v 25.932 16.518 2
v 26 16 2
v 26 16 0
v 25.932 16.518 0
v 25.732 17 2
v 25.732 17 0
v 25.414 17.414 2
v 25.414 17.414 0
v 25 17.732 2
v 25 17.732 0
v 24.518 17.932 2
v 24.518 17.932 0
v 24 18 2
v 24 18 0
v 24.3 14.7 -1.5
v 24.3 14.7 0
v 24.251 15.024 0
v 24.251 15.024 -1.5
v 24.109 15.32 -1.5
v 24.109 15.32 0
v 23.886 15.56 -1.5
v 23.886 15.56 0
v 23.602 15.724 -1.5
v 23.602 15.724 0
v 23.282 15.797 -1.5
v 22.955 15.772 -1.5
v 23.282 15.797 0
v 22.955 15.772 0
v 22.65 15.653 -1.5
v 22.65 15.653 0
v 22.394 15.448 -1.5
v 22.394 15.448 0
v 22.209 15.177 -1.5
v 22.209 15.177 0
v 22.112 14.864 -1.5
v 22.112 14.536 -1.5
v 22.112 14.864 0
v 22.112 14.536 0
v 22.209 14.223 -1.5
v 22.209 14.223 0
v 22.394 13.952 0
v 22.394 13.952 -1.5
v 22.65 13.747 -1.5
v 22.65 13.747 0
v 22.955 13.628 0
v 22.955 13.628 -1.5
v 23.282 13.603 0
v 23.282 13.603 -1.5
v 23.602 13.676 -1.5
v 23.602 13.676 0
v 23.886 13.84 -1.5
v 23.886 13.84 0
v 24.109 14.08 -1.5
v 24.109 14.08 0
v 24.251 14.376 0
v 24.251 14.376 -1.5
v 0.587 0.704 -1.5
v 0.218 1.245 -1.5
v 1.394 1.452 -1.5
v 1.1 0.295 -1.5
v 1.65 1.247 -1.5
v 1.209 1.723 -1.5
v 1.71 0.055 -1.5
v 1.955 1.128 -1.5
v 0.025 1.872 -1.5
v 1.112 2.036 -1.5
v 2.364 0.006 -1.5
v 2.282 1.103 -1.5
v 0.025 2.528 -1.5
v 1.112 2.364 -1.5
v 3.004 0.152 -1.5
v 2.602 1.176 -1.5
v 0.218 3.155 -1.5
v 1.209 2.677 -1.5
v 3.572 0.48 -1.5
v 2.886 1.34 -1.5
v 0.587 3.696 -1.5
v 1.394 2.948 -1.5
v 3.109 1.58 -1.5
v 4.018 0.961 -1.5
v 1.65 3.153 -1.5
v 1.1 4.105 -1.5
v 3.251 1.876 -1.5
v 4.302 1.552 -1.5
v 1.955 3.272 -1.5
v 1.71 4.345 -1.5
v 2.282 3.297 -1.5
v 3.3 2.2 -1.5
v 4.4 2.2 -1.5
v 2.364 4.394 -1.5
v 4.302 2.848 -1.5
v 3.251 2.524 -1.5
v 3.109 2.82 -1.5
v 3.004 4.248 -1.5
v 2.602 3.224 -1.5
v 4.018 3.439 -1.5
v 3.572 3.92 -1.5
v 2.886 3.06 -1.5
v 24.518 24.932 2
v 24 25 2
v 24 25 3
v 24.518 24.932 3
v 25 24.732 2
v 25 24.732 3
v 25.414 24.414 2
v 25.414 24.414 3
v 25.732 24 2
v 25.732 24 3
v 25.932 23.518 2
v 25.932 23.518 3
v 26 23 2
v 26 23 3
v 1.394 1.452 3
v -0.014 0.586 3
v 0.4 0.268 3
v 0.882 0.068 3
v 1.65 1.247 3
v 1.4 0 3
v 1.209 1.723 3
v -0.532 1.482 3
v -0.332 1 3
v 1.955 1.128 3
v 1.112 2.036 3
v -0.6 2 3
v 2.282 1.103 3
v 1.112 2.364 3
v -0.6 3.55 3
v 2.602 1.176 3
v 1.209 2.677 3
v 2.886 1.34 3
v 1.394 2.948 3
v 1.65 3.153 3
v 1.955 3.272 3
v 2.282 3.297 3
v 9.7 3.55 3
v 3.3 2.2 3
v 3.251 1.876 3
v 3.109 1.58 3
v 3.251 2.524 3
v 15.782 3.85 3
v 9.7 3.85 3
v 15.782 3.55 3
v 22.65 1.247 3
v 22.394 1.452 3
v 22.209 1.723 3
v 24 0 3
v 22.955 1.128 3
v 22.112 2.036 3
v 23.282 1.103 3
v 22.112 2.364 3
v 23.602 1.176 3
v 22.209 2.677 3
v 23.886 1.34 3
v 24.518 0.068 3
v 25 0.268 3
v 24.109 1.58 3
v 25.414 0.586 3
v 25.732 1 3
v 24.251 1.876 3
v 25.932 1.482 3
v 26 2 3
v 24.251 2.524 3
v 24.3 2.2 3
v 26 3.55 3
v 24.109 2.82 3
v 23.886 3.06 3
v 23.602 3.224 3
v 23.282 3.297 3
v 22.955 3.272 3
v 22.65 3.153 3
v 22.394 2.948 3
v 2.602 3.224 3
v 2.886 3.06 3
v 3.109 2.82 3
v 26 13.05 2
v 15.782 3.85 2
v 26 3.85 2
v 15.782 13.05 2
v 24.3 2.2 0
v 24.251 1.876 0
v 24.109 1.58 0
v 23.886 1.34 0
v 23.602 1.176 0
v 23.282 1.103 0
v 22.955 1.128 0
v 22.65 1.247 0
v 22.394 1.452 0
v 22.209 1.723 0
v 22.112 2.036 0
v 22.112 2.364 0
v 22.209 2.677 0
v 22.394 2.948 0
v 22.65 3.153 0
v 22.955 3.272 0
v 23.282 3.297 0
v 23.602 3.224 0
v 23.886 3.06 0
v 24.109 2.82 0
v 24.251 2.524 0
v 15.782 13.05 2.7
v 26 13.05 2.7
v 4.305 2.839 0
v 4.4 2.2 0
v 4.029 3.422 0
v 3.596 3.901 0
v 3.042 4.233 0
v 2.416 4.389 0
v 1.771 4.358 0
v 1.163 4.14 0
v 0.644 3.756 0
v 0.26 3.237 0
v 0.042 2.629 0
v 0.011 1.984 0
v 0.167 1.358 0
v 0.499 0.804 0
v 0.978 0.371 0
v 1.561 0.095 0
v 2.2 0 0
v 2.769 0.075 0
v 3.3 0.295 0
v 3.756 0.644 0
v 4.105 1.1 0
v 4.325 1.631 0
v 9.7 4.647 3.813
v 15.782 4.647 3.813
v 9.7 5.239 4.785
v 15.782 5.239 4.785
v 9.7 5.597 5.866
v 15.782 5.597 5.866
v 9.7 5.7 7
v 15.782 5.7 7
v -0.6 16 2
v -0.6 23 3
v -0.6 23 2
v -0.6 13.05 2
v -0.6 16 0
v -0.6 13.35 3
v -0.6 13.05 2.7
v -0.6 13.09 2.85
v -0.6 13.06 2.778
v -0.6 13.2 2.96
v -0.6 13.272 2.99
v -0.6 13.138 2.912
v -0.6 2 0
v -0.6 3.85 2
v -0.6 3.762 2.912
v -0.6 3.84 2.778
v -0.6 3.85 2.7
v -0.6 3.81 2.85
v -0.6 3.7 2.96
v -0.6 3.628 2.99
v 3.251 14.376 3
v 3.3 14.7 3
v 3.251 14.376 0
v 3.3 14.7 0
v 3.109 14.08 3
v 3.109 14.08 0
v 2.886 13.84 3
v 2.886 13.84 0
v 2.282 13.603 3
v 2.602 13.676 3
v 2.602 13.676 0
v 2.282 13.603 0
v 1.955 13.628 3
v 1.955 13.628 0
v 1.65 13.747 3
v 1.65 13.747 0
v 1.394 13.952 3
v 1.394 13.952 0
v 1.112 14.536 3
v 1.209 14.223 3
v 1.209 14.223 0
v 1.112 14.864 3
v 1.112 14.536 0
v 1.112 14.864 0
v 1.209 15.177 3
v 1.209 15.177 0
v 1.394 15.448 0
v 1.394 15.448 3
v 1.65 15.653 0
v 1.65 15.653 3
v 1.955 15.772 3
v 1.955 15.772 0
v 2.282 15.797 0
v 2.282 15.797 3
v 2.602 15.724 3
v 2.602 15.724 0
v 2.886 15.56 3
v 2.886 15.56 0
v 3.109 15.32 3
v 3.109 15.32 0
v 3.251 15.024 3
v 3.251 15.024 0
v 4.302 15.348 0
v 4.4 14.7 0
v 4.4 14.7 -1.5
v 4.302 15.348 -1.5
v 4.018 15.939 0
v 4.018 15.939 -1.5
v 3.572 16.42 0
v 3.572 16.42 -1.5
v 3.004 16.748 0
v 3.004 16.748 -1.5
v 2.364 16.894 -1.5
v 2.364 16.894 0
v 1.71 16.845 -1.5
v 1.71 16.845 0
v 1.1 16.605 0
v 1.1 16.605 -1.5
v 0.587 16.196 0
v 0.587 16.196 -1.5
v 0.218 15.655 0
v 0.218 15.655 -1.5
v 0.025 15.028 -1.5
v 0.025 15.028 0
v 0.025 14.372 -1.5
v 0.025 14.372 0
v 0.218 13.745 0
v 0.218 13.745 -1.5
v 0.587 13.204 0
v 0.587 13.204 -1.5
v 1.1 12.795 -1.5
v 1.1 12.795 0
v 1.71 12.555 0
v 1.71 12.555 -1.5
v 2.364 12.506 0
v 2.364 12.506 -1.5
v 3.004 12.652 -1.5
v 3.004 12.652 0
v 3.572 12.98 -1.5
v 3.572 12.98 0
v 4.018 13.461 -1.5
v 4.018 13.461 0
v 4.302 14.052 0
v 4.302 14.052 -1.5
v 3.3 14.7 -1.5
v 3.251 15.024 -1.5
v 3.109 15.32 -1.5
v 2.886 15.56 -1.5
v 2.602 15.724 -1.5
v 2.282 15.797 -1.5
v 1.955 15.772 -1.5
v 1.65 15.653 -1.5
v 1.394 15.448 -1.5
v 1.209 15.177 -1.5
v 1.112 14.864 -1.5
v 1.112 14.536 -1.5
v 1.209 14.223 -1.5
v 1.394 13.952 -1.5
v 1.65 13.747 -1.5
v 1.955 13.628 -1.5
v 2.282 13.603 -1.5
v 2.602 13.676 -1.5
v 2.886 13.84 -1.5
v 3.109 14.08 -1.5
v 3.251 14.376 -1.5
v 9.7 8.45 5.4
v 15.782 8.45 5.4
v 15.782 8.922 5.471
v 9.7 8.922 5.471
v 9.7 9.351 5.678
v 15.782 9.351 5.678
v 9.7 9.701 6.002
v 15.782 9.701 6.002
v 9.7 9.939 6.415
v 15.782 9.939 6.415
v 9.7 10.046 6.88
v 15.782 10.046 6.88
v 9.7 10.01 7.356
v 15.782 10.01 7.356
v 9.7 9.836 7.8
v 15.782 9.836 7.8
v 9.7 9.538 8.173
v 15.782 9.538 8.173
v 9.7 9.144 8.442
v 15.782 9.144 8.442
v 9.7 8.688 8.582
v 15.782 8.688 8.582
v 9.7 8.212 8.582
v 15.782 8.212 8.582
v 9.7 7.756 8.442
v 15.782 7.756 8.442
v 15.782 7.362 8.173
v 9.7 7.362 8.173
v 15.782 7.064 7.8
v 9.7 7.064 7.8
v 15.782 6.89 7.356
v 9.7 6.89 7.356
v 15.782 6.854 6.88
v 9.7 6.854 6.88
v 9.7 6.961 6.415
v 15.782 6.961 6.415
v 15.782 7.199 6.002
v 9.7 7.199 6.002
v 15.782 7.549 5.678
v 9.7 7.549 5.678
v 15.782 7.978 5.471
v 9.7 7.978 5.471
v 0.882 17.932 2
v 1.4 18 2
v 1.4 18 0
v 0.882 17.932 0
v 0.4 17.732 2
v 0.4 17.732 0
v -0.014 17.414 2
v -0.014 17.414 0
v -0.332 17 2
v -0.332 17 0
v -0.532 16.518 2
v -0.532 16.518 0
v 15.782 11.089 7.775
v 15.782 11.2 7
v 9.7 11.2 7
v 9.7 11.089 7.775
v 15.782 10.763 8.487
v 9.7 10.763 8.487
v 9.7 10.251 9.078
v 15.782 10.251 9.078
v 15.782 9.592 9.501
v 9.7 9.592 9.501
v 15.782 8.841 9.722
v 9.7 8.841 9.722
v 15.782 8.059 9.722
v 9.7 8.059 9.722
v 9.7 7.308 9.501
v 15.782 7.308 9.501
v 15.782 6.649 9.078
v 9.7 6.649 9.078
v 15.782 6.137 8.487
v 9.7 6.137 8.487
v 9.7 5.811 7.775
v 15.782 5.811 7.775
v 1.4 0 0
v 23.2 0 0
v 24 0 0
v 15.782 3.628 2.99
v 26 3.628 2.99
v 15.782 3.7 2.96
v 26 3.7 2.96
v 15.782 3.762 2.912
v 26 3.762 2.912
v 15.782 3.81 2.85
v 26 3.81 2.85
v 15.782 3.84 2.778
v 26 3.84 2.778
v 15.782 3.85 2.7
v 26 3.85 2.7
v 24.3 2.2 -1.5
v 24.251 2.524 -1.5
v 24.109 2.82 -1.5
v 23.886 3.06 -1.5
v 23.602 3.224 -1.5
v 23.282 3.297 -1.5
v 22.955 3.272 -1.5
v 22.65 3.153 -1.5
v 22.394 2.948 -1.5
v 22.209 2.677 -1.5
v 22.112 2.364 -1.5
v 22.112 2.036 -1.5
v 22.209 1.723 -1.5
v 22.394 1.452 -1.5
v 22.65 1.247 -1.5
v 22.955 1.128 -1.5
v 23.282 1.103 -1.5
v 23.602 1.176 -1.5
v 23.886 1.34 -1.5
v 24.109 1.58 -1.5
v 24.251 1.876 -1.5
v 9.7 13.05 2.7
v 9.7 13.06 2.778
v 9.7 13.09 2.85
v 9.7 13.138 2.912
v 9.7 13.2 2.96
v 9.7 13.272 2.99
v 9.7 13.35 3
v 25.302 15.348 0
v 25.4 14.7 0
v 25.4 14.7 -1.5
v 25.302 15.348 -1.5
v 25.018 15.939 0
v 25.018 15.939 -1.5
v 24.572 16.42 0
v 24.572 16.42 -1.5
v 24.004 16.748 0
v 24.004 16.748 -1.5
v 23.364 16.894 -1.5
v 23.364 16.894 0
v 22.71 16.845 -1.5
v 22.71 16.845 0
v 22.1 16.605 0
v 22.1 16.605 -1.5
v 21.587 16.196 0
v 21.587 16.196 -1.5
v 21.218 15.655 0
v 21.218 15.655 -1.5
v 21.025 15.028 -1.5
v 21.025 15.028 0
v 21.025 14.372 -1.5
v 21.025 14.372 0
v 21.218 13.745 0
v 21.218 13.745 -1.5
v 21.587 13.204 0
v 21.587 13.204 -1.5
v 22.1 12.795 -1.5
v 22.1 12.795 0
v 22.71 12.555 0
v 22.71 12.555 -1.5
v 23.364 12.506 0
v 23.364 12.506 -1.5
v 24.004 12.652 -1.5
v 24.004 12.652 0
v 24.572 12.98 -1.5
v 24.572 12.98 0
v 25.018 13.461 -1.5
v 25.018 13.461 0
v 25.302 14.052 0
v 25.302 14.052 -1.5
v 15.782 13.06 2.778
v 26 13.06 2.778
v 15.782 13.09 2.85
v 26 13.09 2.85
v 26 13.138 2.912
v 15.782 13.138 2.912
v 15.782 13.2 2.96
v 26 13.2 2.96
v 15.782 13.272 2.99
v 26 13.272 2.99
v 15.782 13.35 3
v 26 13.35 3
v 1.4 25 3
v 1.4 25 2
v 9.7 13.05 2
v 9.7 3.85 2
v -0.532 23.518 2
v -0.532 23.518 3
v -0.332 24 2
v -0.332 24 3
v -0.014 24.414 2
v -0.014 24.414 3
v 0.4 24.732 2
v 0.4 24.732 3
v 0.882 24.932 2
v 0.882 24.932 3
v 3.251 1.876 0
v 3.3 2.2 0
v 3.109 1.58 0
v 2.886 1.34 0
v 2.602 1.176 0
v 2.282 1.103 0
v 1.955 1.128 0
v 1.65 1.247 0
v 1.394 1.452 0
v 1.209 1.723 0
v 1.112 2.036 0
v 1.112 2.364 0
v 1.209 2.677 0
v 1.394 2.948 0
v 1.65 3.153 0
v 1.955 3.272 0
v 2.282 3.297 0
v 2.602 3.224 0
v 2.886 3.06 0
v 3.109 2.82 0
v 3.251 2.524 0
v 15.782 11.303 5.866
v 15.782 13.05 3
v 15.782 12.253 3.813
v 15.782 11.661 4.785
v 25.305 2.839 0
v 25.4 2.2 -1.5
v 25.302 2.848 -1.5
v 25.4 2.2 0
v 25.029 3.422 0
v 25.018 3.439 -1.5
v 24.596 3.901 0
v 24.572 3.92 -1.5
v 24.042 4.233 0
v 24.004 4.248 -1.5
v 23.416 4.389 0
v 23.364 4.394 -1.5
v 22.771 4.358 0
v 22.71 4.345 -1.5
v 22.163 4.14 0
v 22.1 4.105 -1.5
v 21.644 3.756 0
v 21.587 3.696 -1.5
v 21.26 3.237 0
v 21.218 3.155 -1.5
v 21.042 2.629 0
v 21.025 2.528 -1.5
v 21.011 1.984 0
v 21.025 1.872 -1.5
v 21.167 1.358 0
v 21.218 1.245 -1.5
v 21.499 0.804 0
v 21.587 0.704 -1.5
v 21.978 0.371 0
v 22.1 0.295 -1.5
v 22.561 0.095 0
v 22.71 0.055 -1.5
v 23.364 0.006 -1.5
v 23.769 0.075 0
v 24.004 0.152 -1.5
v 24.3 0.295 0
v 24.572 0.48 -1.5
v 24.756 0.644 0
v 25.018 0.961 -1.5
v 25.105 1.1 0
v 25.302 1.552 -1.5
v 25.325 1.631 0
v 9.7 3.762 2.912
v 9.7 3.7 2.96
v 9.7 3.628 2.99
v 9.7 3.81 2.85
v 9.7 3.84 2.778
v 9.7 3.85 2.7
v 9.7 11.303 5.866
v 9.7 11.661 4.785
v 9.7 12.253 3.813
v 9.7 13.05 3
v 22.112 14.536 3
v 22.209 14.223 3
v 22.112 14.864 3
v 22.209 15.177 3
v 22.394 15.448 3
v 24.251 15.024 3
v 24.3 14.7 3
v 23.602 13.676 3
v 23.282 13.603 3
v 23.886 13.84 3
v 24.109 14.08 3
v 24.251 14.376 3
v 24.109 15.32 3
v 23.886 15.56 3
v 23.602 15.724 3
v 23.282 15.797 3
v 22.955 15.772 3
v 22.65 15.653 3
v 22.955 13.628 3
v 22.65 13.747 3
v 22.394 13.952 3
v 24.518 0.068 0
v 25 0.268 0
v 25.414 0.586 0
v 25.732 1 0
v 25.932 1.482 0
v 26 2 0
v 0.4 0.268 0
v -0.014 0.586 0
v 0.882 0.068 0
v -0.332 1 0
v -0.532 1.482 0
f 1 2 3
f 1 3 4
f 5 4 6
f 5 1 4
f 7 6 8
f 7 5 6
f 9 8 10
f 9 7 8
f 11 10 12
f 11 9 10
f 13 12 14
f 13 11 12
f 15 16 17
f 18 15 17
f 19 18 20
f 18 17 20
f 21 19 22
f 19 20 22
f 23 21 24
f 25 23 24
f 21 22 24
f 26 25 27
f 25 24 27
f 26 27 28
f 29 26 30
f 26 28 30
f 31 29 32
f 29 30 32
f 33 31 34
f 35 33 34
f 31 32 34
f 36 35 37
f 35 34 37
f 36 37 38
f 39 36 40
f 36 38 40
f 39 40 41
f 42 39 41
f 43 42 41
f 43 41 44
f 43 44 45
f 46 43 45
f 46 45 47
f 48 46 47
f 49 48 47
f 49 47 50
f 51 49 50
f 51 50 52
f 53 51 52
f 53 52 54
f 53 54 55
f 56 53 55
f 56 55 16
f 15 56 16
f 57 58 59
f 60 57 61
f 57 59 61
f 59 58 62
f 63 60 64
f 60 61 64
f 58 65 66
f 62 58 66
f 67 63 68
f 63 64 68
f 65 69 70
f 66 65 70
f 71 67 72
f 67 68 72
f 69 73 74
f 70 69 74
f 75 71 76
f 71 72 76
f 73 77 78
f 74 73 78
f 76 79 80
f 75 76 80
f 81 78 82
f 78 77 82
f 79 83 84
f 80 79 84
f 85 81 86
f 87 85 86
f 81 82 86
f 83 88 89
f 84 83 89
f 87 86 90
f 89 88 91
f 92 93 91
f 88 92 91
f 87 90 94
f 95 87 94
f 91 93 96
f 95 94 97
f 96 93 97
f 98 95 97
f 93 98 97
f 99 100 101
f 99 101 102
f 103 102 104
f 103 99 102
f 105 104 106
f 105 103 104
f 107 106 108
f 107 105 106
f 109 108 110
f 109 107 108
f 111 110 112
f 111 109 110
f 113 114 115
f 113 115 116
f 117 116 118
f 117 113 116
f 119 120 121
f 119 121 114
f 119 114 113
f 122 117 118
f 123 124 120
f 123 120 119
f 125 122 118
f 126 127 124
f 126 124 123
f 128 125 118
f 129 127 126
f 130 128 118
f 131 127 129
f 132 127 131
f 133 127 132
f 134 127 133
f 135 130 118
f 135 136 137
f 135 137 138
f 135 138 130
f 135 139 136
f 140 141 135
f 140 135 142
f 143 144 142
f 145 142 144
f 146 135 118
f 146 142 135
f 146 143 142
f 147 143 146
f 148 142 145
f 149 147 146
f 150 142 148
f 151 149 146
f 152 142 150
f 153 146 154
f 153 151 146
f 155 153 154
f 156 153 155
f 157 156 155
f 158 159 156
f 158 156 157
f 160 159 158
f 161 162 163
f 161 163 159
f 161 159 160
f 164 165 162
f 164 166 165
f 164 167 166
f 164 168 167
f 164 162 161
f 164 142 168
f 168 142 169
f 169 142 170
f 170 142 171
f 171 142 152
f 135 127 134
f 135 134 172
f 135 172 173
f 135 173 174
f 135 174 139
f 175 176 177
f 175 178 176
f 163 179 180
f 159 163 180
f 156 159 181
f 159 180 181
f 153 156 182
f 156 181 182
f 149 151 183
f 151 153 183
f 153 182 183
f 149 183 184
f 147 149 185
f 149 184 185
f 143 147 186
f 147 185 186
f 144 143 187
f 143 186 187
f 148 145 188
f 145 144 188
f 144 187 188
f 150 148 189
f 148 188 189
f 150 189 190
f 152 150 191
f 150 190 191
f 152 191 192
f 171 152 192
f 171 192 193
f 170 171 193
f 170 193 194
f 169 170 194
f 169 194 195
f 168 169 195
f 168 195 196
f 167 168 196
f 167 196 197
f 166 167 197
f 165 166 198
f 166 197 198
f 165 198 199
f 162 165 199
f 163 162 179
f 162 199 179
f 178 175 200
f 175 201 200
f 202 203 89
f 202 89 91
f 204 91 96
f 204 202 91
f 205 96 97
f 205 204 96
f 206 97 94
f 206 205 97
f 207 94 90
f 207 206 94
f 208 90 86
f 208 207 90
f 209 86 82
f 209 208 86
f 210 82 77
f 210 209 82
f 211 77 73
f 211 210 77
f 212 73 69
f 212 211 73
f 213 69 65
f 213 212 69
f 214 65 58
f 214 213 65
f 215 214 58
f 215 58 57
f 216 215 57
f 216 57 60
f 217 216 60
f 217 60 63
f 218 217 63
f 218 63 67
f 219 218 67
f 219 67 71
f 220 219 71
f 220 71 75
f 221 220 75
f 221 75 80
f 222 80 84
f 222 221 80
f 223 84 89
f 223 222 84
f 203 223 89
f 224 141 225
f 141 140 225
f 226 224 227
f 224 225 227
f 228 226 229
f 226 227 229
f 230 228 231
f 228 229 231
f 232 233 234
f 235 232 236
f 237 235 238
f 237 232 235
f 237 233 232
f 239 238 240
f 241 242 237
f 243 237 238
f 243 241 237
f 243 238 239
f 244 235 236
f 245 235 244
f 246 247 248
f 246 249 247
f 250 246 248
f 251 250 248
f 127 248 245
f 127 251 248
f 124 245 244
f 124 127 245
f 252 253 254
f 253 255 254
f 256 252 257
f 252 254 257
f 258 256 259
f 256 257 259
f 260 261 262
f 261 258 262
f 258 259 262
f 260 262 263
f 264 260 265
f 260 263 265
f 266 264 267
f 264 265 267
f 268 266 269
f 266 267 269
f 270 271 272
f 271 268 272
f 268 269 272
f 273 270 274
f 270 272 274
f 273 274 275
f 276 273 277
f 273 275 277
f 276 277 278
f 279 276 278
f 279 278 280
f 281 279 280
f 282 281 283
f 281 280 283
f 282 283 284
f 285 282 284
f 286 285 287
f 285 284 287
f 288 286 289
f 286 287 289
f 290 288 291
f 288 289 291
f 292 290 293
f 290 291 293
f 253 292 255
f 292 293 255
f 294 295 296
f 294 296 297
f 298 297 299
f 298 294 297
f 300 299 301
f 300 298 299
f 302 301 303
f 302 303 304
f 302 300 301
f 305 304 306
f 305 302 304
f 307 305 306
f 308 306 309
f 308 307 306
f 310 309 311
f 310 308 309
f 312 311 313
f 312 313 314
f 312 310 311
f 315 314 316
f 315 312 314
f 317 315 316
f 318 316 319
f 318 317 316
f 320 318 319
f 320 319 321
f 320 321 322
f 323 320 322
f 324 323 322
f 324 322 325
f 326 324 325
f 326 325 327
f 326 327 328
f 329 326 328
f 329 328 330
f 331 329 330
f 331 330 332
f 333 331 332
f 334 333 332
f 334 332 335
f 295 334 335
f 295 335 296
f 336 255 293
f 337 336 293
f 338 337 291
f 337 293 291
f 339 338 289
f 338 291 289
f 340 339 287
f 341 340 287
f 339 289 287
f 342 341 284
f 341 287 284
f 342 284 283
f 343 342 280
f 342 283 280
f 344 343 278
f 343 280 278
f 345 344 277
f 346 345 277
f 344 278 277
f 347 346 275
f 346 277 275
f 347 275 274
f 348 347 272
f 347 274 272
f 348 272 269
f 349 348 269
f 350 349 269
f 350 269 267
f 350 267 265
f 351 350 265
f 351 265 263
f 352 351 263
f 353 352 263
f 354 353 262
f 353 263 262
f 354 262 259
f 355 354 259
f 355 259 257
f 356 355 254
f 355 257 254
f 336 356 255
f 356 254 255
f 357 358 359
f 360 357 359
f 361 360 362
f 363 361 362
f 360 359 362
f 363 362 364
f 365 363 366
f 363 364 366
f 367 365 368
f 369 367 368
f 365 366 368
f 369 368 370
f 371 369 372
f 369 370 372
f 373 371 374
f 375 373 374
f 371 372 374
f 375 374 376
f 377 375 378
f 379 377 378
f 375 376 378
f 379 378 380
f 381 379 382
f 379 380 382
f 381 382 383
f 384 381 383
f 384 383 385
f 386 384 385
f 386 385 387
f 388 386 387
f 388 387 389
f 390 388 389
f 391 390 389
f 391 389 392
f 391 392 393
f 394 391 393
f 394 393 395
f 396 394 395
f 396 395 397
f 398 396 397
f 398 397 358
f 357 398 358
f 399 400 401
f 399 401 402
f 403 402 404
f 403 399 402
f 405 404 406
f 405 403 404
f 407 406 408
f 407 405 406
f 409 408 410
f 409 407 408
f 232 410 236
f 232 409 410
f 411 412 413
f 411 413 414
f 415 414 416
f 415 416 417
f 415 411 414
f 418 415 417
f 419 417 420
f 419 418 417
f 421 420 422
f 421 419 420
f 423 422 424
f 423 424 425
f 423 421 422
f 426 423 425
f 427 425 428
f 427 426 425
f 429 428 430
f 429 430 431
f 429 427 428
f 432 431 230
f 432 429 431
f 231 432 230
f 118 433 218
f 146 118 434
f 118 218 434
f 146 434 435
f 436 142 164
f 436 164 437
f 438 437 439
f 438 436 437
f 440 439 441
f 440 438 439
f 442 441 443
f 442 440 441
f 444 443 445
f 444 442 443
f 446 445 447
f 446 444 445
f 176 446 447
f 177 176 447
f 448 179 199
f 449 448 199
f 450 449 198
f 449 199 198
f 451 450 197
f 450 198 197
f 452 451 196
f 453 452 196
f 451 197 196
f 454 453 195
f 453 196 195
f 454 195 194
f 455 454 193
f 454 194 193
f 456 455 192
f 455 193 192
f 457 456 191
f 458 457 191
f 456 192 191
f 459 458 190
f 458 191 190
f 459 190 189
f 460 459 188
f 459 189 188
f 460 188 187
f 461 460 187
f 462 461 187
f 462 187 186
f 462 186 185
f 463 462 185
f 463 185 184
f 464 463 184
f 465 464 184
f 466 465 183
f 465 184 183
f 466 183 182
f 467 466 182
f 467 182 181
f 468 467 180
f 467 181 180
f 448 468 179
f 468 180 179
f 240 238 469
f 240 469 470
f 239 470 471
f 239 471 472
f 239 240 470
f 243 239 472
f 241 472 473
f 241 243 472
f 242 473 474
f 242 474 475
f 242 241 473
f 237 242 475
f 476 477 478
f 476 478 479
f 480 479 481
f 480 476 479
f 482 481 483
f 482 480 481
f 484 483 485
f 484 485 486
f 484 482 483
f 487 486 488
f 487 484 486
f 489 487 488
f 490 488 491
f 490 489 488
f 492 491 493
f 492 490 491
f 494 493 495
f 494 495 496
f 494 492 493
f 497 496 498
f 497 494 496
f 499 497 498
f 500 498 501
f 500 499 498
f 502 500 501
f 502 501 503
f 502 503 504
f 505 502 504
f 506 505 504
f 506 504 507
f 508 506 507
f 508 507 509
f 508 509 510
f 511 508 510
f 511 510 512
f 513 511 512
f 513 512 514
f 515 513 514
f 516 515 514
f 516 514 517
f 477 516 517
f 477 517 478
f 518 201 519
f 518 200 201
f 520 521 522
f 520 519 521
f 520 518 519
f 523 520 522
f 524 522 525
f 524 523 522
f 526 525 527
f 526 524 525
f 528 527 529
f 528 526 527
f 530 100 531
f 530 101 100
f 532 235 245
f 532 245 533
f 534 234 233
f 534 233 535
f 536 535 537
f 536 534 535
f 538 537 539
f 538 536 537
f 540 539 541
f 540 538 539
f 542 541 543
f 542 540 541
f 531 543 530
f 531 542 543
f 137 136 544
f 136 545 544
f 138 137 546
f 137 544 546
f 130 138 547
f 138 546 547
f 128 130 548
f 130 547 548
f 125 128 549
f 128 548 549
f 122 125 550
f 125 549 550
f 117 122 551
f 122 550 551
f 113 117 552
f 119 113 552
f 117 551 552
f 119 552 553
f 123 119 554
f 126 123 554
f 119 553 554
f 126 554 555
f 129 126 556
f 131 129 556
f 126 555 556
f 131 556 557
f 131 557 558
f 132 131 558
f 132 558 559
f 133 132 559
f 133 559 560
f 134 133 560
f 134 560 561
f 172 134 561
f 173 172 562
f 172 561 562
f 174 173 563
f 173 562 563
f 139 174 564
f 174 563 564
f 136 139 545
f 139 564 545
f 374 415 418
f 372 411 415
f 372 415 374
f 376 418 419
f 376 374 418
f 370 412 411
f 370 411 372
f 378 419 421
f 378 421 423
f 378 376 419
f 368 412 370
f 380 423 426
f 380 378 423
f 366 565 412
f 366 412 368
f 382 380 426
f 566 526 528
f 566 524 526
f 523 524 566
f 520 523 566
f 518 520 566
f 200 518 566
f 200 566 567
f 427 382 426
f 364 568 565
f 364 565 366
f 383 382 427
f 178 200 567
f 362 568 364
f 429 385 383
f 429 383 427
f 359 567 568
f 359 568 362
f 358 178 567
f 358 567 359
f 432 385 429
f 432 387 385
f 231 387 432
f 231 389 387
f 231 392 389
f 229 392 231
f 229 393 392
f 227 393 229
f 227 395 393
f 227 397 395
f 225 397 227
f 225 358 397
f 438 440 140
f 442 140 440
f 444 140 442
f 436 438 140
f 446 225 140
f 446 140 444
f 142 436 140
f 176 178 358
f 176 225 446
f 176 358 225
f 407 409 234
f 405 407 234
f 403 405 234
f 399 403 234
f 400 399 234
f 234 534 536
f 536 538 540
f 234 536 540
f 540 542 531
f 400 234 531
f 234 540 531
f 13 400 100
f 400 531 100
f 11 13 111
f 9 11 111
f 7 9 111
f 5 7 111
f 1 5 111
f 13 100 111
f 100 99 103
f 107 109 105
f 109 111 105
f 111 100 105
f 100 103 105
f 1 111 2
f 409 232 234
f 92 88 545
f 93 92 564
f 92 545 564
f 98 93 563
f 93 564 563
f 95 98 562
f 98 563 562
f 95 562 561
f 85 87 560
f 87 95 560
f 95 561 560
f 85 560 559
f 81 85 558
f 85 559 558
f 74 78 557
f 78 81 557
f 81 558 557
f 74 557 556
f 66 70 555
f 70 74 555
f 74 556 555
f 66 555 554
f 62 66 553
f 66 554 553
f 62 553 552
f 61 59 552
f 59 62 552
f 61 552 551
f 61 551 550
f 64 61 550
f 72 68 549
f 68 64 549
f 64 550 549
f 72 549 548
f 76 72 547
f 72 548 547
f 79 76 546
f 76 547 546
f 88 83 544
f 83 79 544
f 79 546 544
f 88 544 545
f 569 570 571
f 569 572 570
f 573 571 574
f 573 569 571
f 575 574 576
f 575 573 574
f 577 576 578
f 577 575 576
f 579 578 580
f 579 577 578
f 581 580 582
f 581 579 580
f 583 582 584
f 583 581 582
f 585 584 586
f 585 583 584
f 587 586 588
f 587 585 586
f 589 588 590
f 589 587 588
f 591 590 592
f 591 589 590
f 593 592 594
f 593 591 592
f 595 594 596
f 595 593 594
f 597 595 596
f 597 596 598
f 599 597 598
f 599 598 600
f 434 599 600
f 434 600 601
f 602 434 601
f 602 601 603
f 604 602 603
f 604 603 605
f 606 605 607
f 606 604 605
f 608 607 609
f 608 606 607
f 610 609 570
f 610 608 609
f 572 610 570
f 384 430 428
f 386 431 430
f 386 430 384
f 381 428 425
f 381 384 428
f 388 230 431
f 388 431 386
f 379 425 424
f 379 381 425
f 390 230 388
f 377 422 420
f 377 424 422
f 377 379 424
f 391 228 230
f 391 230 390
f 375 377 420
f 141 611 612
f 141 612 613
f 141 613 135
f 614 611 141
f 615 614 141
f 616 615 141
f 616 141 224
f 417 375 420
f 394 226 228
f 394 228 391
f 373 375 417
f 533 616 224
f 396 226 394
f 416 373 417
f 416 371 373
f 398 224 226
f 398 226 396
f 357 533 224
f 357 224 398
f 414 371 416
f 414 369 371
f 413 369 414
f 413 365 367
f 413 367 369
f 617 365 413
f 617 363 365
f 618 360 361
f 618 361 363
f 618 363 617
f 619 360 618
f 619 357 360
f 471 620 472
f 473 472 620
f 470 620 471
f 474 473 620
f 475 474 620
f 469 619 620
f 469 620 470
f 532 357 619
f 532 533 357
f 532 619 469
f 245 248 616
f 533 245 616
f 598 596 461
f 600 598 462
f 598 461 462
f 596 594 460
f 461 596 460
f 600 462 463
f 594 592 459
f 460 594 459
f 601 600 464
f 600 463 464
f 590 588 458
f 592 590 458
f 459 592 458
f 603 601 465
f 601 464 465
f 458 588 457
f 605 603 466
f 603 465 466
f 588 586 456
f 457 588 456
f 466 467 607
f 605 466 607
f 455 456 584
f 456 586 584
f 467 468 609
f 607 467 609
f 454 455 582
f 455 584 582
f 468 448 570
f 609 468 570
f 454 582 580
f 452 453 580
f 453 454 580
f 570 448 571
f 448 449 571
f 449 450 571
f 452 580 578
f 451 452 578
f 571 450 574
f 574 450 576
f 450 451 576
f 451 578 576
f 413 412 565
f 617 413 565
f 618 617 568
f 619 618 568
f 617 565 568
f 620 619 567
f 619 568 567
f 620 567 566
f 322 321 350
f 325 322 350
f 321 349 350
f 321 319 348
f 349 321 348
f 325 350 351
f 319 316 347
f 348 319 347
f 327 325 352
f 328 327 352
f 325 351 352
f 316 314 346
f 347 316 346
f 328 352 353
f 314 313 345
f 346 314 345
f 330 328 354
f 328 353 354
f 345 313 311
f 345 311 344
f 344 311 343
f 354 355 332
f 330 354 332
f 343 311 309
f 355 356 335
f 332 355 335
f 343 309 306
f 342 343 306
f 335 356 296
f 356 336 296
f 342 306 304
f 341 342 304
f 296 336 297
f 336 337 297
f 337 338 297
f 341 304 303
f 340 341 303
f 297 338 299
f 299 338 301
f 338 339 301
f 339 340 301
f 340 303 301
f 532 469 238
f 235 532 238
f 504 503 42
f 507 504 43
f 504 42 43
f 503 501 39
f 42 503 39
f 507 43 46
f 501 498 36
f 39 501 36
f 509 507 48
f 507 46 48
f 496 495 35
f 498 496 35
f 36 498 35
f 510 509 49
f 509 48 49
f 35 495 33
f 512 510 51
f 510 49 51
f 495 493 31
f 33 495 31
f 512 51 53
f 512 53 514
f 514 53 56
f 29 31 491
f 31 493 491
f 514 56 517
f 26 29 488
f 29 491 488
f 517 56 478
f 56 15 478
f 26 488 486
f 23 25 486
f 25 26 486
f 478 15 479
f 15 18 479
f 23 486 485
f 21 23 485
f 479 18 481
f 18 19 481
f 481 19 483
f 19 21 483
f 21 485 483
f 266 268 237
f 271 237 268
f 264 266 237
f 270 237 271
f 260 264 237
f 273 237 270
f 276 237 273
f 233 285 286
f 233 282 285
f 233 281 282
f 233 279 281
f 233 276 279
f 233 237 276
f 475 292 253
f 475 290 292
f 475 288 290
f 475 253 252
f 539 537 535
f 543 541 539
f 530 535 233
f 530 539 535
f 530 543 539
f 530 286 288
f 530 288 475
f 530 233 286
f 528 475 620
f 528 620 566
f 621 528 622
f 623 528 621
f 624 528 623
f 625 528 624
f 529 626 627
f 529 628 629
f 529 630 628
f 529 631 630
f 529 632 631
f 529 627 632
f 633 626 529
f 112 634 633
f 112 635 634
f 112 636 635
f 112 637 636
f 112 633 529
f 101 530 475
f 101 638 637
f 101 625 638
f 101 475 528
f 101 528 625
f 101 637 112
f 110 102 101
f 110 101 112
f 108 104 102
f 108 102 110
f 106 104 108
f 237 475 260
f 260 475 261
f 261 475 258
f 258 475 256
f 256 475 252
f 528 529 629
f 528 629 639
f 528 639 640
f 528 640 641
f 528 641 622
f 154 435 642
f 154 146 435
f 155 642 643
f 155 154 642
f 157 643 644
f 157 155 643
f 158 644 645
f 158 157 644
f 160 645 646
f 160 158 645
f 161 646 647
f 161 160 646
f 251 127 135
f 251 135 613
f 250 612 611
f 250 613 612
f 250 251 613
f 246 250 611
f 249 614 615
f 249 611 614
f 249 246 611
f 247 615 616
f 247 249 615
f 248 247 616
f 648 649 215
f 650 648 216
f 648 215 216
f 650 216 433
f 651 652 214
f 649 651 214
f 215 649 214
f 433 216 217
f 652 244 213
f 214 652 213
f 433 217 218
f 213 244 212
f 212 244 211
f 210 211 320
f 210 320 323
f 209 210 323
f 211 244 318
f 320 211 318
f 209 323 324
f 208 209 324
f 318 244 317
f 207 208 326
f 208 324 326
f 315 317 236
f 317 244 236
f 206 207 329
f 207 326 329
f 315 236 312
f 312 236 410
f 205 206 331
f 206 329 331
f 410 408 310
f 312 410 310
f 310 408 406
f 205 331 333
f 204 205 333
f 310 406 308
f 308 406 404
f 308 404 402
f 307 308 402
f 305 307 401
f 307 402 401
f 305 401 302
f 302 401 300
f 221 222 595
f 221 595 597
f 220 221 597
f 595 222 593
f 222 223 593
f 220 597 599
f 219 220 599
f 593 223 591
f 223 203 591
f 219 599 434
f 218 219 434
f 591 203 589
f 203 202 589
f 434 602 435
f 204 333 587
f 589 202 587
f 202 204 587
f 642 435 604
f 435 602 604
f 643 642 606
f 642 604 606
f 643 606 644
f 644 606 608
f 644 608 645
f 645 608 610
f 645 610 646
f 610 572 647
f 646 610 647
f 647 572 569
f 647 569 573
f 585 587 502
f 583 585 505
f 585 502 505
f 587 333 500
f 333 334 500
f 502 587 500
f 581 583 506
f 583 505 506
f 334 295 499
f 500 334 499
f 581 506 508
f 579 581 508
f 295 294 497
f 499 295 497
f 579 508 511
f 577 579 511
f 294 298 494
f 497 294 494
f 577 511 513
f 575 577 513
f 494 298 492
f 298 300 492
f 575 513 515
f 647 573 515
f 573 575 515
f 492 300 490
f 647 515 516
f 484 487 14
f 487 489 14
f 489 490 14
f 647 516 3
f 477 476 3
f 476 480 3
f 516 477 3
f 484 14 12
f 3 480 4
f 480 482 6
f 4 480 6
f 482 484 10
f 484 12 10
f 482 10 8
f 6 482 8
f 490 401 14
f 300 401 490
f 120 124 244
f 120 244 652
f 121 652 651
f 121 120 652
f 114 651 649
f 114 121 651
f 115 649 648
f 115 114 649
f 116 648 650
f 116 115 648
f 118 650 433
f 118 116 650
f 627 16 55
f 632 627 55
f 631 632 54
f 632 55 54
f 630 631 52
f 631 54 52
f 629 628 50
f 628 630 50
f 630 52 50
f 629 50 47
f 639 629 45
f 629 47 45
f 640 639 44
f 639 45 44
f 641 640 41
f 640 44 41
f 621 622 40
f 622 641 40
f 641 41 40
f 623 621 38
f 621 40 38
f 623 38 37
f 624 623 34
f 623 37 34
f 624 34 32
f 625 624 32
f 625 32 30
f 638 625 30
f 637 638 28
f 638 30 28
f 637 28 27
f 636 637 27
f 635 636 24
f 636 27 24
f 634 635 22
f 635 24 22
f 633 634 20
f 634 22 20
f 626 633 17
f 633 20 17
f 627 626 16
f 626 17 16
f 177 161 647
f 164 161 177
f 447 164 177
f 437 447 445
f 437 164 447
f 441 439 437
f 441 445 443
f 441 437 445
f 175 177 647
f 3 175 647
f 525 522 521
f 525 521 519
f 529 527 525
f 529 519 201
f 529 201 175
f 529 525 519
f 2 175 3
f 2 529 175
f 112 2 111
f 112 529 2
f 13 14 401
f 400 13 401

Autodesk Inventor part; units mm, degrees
ref_plane "YZ Plane" through (0, 0, 0) normal (1, 0, 0) x (0, 1, 0)
ref_plane "XZ Plane" through (0, 0, 0) normal (0, 1, 0) x (-1, 0, 0)
ref_plane "XY Plane" through (0, 0, 0) normal (0, 0, 1) x (1, 0, 0)
sketch "Sketch3" plane through (0, 0, 0) normal (0, 0, 1) x (1, 0, 0)
  line L0 (26, 0) -> (26, 25)
  line L1 (26, 25) -> (2.3151, 25)
  circle A0 centre (2.2, 2.2) radius 2.2
  circle A1 centre (2.2, 2.2) radius 1.1
  circle A2 centre (2.2, 14.7) radius 1.1
  circle A3 centre (2.2, 14.7) radius 2.2
  circle A4 centre (23.2, 2.2) radius 2.2
  circle A5 centre (23.2, 2.2) radius 1.1
  circle A6 centre (23.2, 14.7) radius 1.1
  circle A7 centre (23.2, 14.7) radius 2.2
  line L2 (2.2, 2.2) -> (-0.6, 2.2)
  line L3 (-0.6, 2.2) -> (-0.6, 0)
  line L4 (-0.6, 0) -> (2.2, 0)
  line L5 (2.2, 0) -> (2.2, 2.2)
  line L6 (-0.6, 0) -> (26, 0)
  line L7 (26, 0) -> (26, 25)
  line L8 (26, 25) -> (-0.6, 25)
  line L9 (-0.6, 25) -> (-0.6, 0)
  line L10 (-0.6, 25) -> (26, 25)
  line L11 (26, 25) -> (26, 18)
  line L12 (26, 18) -> (-0.6, 18)
  line L13 (-0.6, 18) -> (-0.6, 25)
  point P0 (0, 0)
  point P1 (-0.6, 18)
  dimension "d14" = 25
  dimension "d15" = 4.4
  dimension "d16" = 2.2
  dimension "d18" = 2.2
  dimension "d19" = 4.4
  dimension "d21" = 4.4
  dimension "d22" = 2.2
  dimension "d23" = 4.4
  dimension "d25" = 7
extrude "Extrusion1" add sketch "Sketch3" along normal blind 3 contours A4 | L6 A0 L2 L9 L12 L0 | L5 A1 L2 A0 | L4 L3 L2 A0 | A0 L2 A1 L5 | A3 | A7
sketch "Sketch5" plane through (0, 0, 3) normal (0, 0, 1) x (1, 0, 0)
  line L0 (26, 0) -> (26, 25)
  line L1 (26, 25) -> (2.3151, 25)
  circle A0 centre (2.2, 2.2) radius 2.2
  circle A1 centre (2.2, 2.2) radius 1.1
  circle A2 centre (2.2, 14.7) radius 1.1
  circle A3 centre (2.2, 14.7) radius 2.2
  circle A4 centre (23.2, 2.2) radius 2.2
  circle A5 centre (23.2, 2.2) radius 1.1
  circle A6 centre (23.2, 14.7) radius 1.1
  circle A7 centre (23.2, 14.7) radius 2.2
  line L2 (2.2, 2.2) -> (-0.6, 2.2)
  line L3 (-0.6, 2.2) -> (-0.6, 0)
  line L4 (-0.6, 0) -> (2.2, 0)
  line L5 (2.2, 0) -> (2.2, 2.2)
  line L6 (-0.6, 0) -> (26, 0)
  line L7 (26, 0) -> (26, 25)
  line L8 (26, 25) -> (-0.6, 25)
  line L9 (-0.6, 25) -> (-0.6, 0)
  line L10 (-0.6, 25) -> (26, 25)
  line L11 (26, 25) -> (26, 18)
  line L12 (26, 18) -> (-0.6, 18)
  line L13 (-0.6, 18) -> (-0.6, 25)
  point P0 (0, 0)
  point P1 (0, 0)
  point P2 (-0.6, 18)
  point P3 (-0.6, 18)
  dimension "d28" = 25
  dimension "d29" = 4.4
  dimension "d30" = 2.2
  dimension "d31" = 2.2
  dimension "d32" = 4.4
  dimension "d33" = 4.4
  dimension "d34" = 2.2
  dimension "d35" = 4.4
  dimension "d36" = 7
extrude "Extrusion2" add sketch "Sketch5" against normal blind 1 contours L12 L9 L8 L1 L0
sketch "Sketch6" plane through (0, 0, 3) normal (0, 0, 1) x (1, 0, 0)
  line L0 (26, 0) -> (26, 25)
  line L1 (26, 25) -> (2.3151, 25)
  circle A0 centre (2.2, 2.2) radius 2.2
  circle A1 centre (2.2, 2.2) radius 1.1
  circle A2 centre (2.2, 14.7) radius 1.1
  circle A3 centre (2.2, 14.7) radius 2.2
  circle A4 centre (23.2, 2.2) radius 2.2
  circle A5 centre (23.2, 2.2) radius 1.1
  circle A6 centre (23.2, 14.7) radius 1.1
  circle A7 centre (23.2, 14.7) radius 2.2
  line L2 (2.2, 2.2) -> (-0.6, 2.2)
  line L3 (-0.6, 2.2) -> (-0.6, 0)
  line L4 (-0.6, 0) -> (2.2, 0)
  line L5 (2.2, 0) -> (2.2, 2.2)
  line L6 (-0.6, 0) -> (26, 0)
  line L7 (26, 0) -> (26, 25)
  line L8 (26, 25) -> (-0.6, 25)
  line L9 (-0.6, 25) -> (-0.6, 0)
  line L10 (-0.6, 25) -> (26, 25)
  line L11 (26, 25) -> (26, 18)
  line L12 (26, 18) -> (-0.6, 18)
  line L13 (-0.6, 18) -> (-0.6, 25)
  point P0 (0, 0)
  point P1 (0, 0)
  point P2 (-0.6, 18)
  dimension "d39" = 25
  dimension "d40" = 4.4
  dimension "d41" = 2.2
  dimension "d42" = 2.2
  dimension "d43" = 4.4
  dimension "d44" = 4.4
  dimension "d45" = 2.2
  dimension "d46" = 4.4
  dimension "d47" = 7
extrude "Extrusion3" add sketch "Sketch6" against normal blind 4.5 contours A4 | L5 A1 L2 A0 | A0 L2 A1 L5 | A3 | A7
fillet "Fillet1" radius 2 6 edges at (26, 25, 2.5) (-0.6, 25, 2.5) (26, 18, 1) (-0.6, 18, 1) (-0.6, 0, 1.5) (26, 0, 1.5)
thread "Thread1" size "M2.2x0.45" class "6H" standard "ANSI Metric M Profile" full length
thread "Thread2" size "M2.2x0.45" class "6H" standard "ANSI Metric M Profile" full length
thread "Thread3" size "M2.2x0.45" class "6H" standard "ANSI Metric M Profile" full length
thread "Thread4" size "M2.2x0.45" class "6H" standard "ANSI Metric M Profile" full length
sketch "Sketch7" plane through (0, 0, 3) normal (0, 0, 1) x (1, 0, 0)
  circle A0 centre (2.2, 2.2) radius 1.1 projected
  circle A1 centre (23.2, 14.7) radius 1.1 projected
  circle A2 centre (2.2, 2.2) radius 2.2 projected
  circle A3 centre (23.2, 14.7) radius 2.2 projected
  line L0 (-0.6, 3.85) -> (26, 3.85)
  line L1 (26, 3.85) -> (26, 13.05)
  line L2 (26, 13.05) -> (-0.6, 13.05)
  line L3 (-0.6, 13.05) -> (-0.6, 3.85)
  point P0 (0, 0)
  point P1 (23.2, 13.05)
  point P2 (2.2, 3.85)
extrude "Extrusion4" cut sketch "Sketch7" against normal blind 1 contours L0 A2 | A2 L0 L3 L2 A3 L1 | A3 L2 picked at (2.5398, 3.9498) picked at (23.5398, 12.9502)
sketch "Sketch8" plane through (0, 0, 2) normal (0, 0, 1) x (1, 0, 0)
  line L0 (-0.6, 3.85) -> (-0.6, 13.05) projected
  line L1 (-0.6, 13.05) -> (26, 13.05) projected
  line L2 (-0.6, 3.85) -> (26, 3.85)
  line L3 (26, 3.85) -> (26, 13.05)
  line L4 (26, 13.05) -> (-0.6, 13.05)
  line L5 (-0.6, 13.05) -> (-0.6, 3.85)
  line L6 (26, 3.85) -> (-0.6, 3.85) projected
  line L7 (12.7, 3.85) -> (14.9828, 3.85)
  line L8 (14.9828, 3.85) -> (12.7, 3.85)
  line L9 (15.7821, 13.05) -> (15.7821, 3.85)
  line L10 (9.7, 3.85) -> (9.7, 13.05)
  point P0 (0, 0)
  point P1 (15.7821, 3.85)
extrude "Extrusion5" add sketch "Sketch8" along normal blind 10 contours L10 L1 L9 L2
fillet "Fillet2" radius 0.3 4 edges at (4.55, 13.05, 3) (4.55, 3.85, 3) (20.8911, 13.05, 3) (20.8911, 3.85, 3)
sketch "Sketch9" plane through (15.7821, 3.85, 2) normal (1, 0, 0) x (0, 0, -1)
  line L0 (0, 0) -> (0, 4.6)
  line L1 (-10, 0) -> (-10, 9.2) projected
  circle A0 centre (-5, 4.6) radius 1.6
  circle A1 centre (-5, 4.6) radius 2.75
  line L2 (-1, 0) -> (-5, 1.85)
  line L3 (-1, 9.2) -> (-10, 9.2) projected
  line L4 (-1, 9.2) -> (-5, 7.35)
  line L5 (0, 0) -> (-0.7, 0) projected
  line L6 (-10, 0) -> (0, 0)
  line L7 (0, 0) -> (0, 9.2)
  line L8 (0, 9.2) -> (-1, 9.2)
  line L9 (-0.7, 9.2) -> (0, 9.2) projected
  line L10 (-1, 0) -> (-1, -0.3) projected
  arc A2 (-1, 0) -> (-5, 1.85) centre (-4.8841, -3.1487) ccw
  arc A3 (-5, 7.35) -> (-1, 9.2) centre (-4.8841, 12.3487) ccw
  point P0 (2, -3.85)
  point P1 (-4.9177, 7.3488)
  point P2 (-4.9177, 1.8512)
  dimension "d69" = 3.2
  dimension "d70" = 5.5
  dimension "d73" = 5
  dimension "d74" = 5
extrude "Extrusion6" cut sketch "Sketch9" against normal blind 10 contours L6 L1 L3 L4 A1 L2 | L2 A2 | A3 L4
sketch "Sketch10" plane through (15.7821, 3.85, 2) normal (1, 0, 0) x (0, 0, -1)
  line L0 (0, 0) -> (0, 4.6)
  line L1 (-10, 0) -> (-10, 9.2)
  circle A0 centre (-5, 4.6) radius 1.6
  circle A1 centre (-5, 4.6) radius 2.75
  line L2 (-1, 0) -> (-5, 1.85)
  line L3 (-1, 9.2) -> (-10, 9.2)
  line L4 (-1, 9.2) -> (-5, 7.35)
  line L5 (0, 0) -> (-0.7, 0)
  line L6 (-10, 0) -> (0, 0)
  line L7 (0, 0) -> (0, 9.2)
  line L8 (0, 9.2) -> (-1, 9.2)
  line L9 (-0.7, 9.2) -> (0, 9.2)
  line L10 (-1, 0) -> (-1, -0.3)
  arc A2 (-1, 0) -> (-5, 1.85) centre (-4.8841, -3.1487) ccw
  arc A3 (-5, 7.35) -> (-1, 9.2) centre (-4.8841, 12.3487) ccw
  point P0 (2, -3.85)
  point P1 (2, -3.85)
  point P2 (-4.9177, 7.3488)
  point P3 (-4.9177, 1.8512)
  dimension "d75" = 3.2
  dimension "d76" = 5.5
  dimension "d77" = 5
  dimension "d78" = 5
extrude "Extrusion7" cut sketch "Sketch10" against normal blind 10 contours A0
thread "Thread5" size "M3.5x0.6" class "6H" standard "ANSI Metric M Profile" full length
properties part number "supCamnovo"
